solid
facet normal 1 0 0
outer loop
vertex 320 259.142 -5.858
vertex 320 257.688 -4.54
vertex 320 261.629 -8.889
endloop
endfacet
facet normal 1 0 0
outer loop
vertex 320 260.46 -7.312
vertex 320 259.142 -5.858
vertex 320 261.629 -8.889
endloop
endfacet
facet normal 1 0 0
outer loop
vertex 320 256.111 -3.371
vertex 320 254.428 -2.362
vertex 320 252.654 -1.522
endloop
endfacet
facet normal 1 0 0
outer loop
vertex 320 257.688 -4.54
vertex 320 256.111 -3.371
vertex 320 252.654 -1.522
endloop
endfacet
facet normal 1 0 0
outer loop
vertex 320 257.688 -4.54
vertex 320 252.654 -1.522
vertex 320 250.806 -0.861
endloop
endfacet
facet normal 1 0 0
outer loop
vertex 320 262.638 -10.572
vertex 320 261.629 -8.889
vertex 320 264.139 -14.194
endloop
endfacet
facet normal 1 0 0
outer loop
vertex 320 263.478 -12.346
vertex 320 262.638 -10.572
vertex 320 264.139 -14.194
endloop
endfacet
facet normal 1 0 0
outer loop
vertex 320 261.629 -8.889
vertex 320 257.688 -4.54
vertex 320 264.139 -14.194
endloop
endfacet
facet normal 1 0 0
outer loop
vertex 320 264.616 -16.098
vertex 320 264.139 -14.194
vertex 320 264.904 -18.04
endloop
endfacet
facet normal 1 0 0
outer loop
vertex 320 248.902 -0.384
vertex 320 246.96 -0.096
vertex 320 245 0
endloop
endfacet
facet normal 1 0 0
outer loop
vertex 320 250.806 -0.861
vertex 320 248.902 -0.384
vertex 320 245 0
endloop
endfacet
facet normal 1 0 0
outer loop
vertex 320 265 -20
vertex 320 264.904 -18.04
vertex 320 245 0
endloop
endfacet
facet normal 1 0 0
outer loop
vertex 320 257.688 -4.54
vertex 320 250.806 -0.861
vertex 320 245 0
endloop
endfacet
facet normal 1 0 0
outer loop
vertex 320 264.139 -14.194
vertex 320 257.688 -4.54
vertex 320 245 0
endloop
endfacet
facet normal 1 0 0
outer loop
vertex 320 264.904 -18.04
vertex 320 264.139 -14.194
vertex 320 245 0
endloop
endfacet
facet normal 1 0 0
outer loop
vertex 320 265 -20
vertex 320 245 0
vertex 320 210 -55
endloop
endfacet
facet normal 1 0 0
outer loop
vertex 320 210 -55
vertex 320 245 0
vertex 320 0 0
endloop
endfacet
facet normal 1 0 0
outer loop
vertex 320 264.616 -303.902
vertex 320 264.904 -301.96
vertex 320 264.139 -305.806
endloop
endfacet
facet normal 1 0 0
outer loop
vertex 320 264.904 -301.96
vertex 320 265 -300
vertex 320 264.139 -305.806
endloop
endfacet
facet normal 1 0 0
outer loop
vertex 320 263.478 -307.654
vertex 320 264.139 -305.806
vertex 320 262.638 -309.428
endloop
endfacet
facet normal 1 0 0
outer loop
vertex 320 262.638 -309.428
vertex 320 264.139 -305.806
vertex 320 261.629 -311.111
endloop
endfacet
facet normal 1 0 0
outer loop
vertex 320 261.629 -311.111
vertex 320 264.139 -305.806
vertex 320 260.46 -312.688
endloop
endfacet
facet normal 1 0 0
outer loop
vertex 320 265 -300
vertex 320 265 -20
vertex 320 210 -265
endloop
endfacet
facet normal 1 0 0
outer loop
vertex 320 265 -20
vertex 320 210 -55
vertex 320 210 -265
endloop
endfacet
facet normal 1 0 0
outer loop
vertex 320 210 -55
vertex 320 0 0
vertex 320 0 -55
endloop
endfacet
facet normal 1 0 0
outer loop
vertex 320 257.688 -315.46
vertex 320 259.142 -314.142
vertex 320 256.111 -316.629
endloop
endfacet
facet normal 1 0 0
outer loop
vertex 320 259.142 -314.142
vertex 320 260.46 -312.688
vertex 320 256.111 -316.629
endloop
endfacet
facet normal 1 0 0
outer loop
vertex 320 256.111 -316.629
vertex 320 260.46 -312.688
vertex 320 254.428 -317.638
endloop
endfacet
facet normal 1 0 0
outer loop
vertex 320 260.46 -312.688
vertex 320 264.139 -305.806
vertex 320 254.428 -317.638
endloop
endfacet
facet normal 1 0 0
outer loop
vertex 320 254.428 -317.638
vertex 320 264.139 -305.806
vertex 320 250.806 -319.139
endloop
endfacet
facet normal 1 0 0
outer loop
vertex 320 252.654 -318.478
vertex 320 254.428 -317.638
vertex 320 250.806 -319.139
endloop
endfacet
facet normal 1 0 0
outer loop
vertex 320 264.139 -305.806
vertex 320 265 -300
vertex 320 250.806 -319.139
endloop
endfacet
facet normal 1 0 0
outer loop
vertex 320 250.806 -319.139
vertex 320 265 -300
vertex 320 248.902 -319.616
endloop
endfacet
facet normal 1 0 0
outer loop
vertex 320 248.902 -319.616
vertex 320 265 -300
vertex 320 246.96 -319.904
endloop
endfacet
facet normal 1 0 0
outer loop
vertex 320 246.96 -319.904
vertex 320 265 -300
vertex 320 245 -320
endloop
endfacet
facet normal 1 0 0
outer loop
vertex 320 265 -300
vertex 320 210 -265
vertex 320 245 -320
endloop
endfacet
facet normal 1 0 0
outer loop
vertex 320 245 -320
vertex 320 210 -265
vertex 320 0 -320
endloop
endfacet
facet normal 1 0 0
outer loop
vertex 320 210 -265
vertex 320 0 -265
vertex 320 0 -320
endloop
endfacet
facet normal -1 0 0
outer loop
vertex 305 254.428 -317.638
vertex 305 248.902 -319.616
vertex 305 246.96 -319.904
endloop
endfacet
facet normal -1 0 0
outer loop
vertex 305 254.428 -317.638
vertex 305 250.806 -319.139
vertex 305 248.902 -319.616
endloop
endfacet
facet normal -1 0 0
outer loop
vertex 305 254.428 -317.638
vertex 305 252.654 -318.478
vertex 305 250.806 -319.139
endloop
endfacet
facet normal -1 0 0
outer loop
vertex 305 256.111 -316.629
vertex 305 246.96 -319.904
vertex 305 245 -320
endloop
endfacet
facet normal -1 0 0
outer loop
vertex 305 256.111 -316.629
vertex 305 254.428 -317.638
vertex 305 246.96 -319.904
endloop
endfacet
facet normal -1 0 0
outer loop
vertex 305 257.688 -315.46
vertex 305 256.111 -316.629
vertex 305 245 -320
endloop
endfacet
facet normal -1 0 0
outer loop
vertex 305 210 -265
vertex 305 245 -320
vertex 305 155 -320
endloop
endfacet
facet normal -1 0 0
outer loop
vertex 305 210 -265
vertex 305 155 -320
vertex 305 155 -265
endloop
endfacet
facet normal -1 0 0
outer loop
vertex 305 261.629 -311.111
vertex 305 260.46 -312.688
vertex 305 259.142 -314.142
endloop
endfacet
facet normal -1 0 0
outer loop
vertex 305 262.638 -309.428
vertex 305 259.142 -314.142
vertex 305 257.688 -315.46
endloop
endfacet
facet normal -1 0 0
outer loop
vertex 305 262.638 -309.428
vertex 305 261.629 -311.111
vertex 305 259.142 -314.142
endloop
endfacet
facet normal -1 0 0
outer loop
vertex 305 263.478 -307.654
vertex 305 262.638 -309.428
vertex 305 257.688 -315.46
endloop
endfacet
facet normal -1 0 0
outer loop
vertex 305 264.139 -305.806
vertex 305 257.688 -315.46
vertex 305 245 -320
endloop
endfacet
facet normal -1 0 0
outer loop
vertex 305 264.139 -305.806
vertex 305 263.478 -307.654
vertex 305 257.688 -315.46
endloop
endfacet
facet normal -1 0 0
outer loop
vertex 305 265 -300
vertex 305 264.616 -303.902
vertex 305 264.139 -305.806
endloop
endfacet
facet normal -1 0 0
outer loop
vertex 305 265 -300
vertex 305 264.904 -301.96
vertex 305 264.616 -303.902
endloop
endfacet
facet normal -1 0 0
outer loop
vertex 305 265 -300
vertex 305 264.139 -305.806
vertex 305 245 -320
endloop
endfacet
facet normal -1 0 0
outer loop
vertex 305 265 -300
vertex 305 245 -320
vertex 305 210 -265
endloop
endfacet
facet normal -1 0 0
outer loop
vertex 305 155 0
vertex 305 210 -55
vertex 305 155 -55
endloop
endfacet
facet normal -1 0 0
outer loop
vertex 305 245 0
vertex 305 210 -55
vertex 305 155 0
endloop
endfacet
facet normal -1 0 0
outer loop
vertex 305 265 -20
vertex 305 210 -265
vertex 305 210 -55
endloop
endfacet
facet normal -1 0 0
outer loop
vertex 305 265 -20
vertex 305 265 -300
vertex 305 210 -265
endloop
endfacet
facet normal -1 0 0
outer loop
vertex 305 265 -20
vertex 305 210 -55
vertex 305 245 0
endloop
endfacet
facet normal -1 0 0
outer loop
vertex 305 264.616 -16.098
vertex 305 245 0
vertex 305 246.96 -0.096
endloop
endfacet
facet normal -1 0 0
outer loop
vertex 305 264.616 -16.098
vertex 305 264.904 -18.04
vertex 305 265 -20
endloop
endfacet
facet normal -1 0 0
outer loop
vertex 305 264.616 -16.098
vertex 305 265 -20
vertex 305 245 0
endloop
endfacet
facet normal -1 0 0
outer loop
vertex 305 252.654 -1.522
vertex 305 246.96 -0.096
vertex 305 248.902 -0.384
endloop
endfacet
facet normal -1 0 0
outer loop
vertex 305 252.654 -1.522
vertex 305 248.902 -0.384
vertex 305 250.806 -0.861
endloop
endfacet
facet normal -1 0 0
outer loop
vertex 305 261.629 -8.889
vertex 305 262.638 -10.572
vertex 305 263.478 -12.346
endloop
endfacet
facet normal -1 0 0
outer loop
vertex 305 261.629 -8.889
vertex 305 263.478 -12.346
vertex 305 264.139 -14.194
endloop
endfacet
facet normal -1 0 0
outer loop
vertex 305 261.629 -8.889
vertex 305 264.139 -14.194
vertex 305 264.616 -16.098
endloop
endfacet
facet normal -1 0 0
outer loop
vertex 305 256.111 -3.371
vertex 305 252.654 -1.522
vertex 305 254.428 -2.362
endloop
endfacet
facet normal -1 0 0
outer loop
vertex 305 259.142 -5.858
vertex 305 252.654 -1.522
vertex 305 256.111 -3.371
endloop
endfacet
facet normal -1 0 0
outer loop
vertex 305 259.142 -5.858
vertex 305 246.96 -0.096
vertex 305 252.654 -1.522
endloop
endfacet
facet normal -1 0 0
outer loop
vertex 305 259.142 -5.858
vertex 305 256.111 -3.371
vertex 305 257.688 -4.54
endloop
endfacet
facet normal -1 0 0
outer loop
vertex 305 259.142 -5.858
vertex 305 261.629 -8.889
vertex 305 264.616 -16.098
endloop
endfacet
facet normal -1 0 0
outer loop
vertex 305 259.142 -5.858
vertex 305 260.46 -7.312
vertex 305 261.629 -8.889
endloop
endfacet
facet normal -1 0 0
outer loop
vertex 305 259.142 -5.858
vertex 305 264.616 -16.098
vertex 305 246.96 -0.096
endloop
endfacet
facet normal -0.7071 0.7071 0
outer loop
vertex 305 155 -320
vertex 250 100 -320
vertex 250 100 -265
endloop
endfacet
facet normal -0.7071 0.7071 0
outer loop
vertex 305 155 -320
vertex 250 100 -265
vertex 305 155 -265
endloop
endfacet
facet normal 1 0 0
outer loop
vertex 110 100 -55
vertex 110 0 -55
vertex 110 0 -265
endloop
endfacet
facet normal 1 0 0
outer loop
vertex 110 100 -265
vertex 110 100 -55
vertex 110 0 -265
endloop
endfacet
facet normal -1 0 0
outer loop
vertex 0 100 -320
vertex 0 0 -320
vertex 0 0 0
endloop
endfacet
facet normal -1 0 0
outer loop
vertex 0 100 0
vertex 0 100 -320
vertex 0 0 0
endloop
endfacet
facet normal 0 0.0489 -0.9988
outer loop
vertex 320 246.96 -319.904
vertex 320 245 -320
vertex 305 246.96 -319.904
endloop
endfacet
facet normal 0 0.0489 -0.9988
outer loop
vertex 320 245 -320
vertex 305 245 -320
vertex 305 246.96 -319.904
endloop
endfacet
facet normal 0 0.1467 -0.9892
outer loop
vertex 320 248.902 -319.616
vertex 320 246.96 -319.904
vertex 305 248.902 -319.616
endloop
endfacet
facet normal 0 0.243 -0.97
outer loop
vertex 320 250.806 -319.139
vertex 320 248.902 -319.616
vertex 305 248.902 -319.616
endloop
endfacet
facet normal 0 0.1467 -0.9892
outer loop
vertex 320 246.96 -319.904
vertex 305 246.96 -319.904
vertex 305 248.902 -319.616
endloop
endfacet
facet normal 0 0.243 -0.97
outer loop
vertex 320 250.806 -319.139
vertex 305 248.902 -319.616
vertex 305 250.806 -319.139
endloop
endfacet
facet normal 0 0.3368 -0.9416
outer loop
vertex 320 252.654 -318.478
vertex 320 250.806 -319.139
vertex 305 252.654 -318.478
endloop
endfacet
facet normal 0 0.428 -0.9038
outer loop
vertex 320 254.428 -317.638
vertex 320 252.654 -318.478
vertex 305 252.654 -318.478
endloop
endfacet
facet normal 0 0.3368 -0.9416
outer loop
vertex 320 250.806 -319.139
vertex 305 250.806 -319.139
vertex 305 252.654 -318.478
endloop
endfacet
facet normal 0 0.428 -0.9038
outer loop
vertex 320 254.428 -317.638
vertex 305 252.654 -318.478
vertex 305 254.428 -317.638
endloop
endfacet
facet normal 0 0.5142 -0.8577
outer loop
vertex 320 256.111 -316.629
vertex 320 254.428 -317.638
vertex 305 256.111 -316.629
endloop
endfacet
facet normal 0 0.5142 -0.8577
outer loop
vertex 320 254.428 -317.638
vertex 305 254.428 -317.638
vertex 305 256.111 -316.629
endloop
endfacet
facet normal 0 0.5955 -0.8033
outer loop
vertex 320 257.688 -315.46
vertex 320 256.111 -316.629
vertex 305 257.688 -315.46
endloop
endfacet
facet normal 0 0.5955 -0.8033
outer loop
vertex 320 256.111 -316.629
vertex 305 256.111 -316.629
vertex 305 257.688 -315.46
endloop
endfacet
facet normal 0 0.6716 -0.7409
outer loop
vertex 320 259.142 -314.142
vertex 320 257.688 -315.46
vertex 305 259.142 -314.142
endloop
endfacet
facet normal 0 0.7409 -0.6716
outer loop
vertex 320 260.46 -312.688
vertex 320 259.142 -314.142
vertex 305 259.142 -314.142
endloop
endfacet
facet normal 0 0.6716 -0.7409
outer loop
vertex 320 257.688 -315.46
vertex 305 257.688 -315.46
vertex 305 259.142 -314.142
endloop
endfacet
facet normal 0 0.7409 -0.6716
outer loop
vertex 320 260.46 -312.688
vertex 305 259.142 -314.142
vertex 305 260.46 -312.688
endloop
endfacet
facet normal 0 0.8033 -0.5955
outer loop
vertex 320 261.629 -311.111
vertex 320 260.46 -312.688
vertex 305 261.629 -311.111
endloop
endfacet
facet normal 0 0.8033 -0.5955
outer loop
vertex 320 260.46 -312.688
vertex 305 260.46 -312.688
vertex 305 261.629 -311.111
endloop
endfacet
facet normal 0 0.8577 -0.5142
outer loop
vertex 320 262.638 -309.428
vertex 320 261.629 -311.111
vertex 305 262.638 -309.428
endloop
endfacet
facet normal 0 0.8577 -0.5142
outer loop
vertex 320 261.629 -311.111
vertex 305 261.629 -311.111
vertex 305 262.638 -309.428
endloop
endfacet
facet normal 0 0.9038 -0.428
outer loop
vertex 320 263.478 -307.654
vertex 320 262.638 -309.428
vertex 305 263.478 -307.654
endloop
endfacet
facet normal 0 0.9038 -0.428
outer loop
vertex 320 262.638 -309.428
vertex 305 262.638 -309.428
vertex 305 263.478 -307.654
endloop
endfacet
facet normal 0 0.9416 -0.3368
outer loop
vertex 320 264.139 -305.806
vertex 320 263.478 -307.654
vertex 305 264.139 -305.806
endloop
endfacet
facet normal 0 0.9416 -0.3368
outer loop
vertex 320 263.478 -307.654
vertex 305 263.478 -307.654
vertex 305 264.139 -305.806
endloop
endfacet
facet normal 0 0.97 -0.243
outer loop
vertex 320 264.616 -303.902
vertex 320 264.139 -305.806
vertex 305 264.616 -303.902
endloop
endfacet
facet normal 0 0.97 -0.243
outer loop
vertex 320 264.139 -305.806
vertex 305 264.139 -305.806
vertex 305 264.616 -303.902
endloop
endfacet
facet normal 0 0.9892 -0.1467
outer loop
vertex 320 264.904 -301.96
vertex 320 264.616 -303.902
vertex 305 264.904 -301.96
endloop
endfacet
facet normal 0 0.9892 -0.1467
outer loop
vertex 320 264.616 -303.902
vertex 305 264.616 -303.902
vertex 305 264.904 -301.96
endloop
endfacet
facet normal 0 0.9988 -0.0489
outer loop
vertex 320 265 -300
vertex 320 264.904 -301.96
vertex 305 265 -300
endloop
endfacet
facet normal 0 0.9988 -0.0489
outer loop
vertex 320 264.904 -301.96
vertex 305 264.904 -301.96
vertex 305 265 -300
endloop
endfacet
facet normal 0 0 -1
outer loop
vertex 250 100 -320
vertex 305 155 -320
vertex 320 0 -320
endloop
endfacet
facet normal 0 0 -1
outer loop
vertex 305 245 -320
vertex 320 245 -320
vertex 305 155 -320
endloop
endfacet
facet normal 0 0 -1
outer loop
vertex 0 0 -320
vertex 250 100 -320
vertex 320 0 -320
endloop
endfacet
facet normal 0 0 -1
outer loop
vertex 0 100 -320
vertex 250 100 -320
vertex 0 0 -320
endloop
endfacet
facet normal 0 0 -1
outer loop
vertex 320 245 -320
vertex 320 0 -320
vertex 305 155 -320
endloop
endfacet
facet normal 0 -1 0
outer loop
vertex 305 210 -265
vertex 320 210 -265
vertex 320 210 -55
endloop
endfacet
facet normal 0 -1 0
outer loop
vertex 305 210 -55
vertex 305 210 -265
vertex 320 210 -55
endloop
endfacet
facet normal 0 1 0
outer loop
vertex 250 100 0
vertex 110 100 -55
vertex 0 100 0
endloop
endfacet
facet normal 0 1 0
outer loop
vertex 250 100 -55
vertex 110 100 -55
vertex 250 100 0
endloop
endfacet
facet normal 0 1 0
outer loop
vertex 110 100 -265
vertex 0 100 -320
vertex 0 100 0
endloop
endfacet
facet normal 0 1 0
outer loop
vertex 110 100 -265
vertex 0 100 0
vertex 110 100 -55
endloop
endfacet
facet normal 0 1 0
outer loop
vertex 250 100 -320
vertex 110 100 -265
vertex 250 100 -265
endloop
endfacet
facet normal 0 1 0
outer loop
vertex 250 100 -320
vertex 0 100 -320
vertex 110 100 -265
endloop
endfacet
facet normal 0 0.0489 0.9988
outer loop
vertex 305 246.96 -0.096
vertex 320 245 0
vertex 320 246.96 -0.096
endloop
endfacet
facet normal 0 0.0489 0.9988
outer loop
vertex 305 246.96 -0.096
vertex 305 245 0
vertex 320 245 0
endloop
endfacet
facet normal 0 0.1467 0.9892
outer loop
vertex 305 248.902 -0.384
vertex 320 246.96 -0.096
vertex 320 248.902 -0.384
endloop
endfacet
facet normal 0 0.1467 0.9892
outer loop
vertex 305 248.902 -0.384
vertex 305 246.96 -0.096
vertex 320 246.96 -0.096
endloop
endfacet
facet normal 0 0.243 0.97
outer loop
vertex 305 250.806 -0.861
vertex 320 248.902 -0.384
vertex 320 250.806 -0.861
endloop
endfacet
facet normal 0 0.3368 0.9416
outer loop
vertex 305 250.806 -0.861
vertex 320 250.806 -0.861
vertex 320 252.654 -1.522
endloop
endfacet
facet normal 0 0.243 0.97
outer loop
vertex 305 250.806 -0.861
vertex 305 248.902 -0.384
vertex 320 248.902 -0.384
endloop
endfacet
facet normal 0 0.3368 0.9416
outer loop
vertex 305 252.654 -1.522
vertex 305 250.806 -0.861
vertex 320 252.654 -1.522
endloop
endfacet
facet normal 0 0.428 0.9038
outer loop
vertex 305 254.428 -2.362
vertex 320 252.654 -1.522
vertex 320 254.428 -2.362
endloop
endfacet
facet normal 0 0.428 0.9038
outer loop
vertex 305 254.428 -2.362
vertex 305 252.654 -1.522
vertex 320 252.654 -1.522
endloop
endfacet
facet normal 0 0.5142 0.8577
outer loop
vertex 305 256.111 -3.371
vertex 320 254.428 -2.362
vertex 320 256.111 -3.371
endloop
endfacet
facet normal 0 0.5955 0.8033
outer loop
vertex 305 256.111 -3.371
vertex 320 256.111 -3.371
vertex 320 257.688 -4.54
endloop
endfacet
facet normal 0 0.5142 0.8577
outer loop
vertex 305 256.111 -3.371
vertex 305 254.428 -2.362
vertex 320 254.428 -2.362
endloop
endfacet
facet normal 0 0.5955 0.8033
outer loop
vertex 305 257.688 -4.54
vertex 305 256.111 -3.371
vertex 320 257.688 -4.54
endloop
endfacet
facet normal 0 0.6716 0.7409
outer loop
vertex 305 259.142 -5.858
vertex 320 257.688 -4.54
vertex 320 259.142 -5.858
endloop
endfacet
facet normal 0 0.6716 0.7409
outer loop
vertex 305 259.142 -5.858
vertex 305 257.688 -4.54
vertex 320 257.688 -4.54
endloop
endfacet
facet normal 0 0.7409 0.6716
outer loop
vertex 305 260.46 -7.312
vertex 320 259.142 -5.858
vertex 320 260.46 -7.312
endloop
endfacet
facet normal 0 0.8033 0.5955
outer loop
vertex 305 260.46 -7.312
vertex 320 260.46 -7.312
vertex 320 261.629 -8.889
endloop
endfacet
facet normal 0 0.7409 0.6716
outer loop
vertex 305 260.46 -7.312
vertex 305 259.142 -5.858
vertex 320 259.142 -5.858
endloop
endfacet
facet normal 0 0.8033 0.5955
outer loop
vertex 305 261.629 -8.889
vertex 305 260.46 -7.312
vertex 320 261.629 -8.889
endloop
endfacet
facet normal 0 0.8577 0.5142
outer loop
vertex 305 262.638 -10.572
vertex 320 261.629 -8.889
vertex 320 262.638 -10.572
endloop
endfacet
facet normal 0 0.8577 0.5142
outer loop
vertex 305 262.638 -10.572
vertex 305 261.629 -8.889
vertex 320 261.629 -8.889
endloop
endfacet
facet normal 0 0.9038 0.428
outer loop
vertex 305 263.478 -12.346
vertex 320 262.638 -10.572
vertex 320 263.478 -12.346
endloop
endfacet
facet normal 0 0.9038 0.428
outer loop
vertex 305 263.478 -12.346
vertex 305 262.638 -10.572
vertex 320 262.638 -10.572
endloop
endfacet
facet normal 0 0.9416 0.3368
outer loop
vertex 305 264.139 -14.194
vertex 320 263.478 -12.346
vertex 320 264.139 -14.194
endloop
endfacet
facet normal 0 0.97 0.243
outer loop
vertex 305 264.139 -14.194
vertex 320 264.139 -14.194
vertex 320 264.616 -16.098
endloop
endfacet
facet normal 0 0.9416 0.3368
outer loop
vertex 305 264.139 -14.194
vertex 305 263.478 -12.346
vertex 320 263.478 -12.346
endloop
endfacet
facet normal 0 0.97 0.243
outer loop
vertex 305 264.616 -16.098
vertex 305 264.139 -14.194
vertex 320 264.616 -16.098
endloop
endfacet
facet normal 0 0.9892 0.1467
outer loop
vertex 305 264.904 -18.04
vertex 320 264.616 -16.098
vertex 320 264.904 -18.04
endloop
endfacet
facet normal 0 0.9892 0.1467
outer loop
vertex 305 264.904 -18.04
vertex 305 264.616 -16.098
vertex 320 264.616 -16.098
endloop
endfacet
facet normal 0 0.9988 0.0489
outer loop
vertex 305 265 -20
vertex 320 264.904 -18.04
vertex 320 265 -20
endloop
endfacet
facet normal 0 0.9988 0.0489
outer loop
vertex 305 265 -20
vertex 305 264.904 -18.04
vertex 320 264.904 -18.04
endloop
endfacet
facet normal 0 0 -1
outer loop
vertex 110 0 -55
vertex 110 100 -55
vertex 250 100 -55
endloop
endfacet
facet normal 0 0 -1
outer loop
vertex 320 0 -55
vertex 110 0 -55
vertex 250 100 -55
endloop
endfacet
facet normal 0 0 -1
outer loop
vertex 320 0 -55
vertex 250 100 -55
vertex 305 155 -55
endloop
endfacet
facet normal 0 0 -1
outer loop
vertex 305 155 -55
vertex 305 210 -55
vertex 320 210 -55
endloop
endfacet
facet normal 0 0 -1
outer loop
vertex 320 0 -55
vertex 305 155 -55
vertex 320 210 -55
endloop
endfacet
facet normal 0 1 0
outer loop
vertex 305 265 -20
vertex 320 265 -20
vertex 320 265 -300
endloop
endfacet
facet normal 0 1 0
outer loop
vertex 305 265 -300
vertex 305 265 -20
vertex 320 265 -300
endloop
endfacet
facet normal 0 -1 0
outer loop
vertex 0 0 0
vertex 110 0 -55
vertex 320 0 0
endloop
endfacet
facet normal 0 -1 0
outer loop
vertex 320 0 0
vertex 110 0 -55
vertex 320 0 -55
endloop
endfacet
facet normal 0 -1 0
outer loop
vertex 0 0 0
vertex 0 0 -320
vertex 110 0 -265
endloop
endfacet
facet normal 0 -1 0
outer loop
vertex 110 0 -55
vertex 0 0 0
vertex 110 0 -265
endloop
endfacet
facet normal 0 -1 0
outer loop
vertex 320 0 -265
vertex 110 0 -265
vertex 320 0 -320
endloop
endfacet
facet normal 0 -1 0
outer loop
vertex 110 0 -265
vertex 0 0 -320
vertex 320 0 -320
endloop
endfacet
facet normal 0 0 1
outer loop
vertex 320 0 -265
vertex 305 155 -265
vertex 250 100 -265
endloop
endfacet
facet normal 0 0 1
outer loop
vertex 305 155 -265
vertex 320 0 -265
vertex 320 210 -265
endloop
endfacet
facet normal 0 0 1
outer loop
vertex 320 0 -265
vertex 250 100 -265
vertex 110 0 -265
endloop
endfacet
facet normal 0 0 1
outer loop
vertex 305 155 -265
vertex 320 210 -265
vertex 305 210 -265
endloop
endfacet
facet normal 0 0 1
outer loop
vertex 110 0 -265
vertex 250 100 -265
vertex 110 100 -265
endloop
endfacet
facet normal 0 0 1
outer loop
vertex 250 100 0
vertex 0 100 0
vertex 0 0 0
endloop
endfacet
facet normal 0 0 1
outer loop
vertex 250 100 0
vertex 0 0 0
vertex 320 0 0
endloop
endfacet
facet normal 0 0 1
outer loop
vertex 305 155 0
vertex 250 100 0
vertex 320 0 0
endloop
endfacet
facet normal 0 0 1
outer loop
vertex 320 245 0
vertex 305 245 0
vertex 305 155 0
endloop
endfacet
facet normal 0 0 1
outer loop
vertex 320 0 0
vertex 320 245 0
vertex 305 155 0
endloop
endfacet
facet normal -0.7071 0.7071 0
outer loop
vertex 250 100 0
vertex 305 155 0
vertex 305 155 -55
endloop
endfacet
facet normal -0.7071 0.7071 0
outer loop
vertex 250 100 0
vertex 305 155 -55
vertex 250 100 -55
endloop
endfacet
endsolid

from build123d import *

# Parameters (mm, degrees)
EXTRUDE_1_DEPTH = 100
EXTRUDE_2_DEPTH = 15
EXTRUDE_3_DEPTH = 55
EXTRUDE_4_DEPTH = 55
FILLET_1_R      = 20


with BuildPart() as part:
    # 草图1 → 凸台-拉伸1 (new body)
    with BuildSketch(Plane(origin=(0, 0, 0), x_dir=(1, 0, 0), z_dir=(0, 1, 0))):
        Polygon((0, 0), (320, 0), (320, 55), (110, 55), (110, 265), (320, 265), (320, 320), (0, 320), align=None)
    extrude(amount=EXTRUDE_1_DEPTH)

    # 草图2 → 凸台-拉伸2 (add)
    with BuildSketch(Plane(origin=(320, 0, 0), x_dir=(0, 0, -1), z_dir=(1, 0, 0))):
        Polygon((0, 0), (0, 265), (320, 265), (320, 0), (265, 0), (265, 210), (55, 210), (55, 0), align=None)
    extrude(amount=-EXTRUDE_2_DEPTH)

    # 草图3 → 凸台-拉伸3 (add)
    with BuildSketch(Plane.XY):
        Polygon((250, 100), (305, 100), (305, 155), align=None)
    extrude(amount=-EXTRUDE_3_DEPTH)

    # 草图4 → 凸台-拉伸4 (add)
    with BuildSketch(Plane(origin=(0, 0, -320), x_dir=(-1, 0, 0), z_dir=(0, 0, -1))):
        Polygon((-305, 155), (-305, 100), (-250, 100), align=None)
    extrude(amount=-EXTRUDE_4_DEPTH)

    # 圆角1
    fillet_1_edges = [part.edges().sort_by_distance(p)[0] for p in [
        (312.5, 265, -320),
        (312.5, 265, 0),
    ]]
    fillet(fillet_1_edges, radius=FILLET_1_R)


solid = part.part
